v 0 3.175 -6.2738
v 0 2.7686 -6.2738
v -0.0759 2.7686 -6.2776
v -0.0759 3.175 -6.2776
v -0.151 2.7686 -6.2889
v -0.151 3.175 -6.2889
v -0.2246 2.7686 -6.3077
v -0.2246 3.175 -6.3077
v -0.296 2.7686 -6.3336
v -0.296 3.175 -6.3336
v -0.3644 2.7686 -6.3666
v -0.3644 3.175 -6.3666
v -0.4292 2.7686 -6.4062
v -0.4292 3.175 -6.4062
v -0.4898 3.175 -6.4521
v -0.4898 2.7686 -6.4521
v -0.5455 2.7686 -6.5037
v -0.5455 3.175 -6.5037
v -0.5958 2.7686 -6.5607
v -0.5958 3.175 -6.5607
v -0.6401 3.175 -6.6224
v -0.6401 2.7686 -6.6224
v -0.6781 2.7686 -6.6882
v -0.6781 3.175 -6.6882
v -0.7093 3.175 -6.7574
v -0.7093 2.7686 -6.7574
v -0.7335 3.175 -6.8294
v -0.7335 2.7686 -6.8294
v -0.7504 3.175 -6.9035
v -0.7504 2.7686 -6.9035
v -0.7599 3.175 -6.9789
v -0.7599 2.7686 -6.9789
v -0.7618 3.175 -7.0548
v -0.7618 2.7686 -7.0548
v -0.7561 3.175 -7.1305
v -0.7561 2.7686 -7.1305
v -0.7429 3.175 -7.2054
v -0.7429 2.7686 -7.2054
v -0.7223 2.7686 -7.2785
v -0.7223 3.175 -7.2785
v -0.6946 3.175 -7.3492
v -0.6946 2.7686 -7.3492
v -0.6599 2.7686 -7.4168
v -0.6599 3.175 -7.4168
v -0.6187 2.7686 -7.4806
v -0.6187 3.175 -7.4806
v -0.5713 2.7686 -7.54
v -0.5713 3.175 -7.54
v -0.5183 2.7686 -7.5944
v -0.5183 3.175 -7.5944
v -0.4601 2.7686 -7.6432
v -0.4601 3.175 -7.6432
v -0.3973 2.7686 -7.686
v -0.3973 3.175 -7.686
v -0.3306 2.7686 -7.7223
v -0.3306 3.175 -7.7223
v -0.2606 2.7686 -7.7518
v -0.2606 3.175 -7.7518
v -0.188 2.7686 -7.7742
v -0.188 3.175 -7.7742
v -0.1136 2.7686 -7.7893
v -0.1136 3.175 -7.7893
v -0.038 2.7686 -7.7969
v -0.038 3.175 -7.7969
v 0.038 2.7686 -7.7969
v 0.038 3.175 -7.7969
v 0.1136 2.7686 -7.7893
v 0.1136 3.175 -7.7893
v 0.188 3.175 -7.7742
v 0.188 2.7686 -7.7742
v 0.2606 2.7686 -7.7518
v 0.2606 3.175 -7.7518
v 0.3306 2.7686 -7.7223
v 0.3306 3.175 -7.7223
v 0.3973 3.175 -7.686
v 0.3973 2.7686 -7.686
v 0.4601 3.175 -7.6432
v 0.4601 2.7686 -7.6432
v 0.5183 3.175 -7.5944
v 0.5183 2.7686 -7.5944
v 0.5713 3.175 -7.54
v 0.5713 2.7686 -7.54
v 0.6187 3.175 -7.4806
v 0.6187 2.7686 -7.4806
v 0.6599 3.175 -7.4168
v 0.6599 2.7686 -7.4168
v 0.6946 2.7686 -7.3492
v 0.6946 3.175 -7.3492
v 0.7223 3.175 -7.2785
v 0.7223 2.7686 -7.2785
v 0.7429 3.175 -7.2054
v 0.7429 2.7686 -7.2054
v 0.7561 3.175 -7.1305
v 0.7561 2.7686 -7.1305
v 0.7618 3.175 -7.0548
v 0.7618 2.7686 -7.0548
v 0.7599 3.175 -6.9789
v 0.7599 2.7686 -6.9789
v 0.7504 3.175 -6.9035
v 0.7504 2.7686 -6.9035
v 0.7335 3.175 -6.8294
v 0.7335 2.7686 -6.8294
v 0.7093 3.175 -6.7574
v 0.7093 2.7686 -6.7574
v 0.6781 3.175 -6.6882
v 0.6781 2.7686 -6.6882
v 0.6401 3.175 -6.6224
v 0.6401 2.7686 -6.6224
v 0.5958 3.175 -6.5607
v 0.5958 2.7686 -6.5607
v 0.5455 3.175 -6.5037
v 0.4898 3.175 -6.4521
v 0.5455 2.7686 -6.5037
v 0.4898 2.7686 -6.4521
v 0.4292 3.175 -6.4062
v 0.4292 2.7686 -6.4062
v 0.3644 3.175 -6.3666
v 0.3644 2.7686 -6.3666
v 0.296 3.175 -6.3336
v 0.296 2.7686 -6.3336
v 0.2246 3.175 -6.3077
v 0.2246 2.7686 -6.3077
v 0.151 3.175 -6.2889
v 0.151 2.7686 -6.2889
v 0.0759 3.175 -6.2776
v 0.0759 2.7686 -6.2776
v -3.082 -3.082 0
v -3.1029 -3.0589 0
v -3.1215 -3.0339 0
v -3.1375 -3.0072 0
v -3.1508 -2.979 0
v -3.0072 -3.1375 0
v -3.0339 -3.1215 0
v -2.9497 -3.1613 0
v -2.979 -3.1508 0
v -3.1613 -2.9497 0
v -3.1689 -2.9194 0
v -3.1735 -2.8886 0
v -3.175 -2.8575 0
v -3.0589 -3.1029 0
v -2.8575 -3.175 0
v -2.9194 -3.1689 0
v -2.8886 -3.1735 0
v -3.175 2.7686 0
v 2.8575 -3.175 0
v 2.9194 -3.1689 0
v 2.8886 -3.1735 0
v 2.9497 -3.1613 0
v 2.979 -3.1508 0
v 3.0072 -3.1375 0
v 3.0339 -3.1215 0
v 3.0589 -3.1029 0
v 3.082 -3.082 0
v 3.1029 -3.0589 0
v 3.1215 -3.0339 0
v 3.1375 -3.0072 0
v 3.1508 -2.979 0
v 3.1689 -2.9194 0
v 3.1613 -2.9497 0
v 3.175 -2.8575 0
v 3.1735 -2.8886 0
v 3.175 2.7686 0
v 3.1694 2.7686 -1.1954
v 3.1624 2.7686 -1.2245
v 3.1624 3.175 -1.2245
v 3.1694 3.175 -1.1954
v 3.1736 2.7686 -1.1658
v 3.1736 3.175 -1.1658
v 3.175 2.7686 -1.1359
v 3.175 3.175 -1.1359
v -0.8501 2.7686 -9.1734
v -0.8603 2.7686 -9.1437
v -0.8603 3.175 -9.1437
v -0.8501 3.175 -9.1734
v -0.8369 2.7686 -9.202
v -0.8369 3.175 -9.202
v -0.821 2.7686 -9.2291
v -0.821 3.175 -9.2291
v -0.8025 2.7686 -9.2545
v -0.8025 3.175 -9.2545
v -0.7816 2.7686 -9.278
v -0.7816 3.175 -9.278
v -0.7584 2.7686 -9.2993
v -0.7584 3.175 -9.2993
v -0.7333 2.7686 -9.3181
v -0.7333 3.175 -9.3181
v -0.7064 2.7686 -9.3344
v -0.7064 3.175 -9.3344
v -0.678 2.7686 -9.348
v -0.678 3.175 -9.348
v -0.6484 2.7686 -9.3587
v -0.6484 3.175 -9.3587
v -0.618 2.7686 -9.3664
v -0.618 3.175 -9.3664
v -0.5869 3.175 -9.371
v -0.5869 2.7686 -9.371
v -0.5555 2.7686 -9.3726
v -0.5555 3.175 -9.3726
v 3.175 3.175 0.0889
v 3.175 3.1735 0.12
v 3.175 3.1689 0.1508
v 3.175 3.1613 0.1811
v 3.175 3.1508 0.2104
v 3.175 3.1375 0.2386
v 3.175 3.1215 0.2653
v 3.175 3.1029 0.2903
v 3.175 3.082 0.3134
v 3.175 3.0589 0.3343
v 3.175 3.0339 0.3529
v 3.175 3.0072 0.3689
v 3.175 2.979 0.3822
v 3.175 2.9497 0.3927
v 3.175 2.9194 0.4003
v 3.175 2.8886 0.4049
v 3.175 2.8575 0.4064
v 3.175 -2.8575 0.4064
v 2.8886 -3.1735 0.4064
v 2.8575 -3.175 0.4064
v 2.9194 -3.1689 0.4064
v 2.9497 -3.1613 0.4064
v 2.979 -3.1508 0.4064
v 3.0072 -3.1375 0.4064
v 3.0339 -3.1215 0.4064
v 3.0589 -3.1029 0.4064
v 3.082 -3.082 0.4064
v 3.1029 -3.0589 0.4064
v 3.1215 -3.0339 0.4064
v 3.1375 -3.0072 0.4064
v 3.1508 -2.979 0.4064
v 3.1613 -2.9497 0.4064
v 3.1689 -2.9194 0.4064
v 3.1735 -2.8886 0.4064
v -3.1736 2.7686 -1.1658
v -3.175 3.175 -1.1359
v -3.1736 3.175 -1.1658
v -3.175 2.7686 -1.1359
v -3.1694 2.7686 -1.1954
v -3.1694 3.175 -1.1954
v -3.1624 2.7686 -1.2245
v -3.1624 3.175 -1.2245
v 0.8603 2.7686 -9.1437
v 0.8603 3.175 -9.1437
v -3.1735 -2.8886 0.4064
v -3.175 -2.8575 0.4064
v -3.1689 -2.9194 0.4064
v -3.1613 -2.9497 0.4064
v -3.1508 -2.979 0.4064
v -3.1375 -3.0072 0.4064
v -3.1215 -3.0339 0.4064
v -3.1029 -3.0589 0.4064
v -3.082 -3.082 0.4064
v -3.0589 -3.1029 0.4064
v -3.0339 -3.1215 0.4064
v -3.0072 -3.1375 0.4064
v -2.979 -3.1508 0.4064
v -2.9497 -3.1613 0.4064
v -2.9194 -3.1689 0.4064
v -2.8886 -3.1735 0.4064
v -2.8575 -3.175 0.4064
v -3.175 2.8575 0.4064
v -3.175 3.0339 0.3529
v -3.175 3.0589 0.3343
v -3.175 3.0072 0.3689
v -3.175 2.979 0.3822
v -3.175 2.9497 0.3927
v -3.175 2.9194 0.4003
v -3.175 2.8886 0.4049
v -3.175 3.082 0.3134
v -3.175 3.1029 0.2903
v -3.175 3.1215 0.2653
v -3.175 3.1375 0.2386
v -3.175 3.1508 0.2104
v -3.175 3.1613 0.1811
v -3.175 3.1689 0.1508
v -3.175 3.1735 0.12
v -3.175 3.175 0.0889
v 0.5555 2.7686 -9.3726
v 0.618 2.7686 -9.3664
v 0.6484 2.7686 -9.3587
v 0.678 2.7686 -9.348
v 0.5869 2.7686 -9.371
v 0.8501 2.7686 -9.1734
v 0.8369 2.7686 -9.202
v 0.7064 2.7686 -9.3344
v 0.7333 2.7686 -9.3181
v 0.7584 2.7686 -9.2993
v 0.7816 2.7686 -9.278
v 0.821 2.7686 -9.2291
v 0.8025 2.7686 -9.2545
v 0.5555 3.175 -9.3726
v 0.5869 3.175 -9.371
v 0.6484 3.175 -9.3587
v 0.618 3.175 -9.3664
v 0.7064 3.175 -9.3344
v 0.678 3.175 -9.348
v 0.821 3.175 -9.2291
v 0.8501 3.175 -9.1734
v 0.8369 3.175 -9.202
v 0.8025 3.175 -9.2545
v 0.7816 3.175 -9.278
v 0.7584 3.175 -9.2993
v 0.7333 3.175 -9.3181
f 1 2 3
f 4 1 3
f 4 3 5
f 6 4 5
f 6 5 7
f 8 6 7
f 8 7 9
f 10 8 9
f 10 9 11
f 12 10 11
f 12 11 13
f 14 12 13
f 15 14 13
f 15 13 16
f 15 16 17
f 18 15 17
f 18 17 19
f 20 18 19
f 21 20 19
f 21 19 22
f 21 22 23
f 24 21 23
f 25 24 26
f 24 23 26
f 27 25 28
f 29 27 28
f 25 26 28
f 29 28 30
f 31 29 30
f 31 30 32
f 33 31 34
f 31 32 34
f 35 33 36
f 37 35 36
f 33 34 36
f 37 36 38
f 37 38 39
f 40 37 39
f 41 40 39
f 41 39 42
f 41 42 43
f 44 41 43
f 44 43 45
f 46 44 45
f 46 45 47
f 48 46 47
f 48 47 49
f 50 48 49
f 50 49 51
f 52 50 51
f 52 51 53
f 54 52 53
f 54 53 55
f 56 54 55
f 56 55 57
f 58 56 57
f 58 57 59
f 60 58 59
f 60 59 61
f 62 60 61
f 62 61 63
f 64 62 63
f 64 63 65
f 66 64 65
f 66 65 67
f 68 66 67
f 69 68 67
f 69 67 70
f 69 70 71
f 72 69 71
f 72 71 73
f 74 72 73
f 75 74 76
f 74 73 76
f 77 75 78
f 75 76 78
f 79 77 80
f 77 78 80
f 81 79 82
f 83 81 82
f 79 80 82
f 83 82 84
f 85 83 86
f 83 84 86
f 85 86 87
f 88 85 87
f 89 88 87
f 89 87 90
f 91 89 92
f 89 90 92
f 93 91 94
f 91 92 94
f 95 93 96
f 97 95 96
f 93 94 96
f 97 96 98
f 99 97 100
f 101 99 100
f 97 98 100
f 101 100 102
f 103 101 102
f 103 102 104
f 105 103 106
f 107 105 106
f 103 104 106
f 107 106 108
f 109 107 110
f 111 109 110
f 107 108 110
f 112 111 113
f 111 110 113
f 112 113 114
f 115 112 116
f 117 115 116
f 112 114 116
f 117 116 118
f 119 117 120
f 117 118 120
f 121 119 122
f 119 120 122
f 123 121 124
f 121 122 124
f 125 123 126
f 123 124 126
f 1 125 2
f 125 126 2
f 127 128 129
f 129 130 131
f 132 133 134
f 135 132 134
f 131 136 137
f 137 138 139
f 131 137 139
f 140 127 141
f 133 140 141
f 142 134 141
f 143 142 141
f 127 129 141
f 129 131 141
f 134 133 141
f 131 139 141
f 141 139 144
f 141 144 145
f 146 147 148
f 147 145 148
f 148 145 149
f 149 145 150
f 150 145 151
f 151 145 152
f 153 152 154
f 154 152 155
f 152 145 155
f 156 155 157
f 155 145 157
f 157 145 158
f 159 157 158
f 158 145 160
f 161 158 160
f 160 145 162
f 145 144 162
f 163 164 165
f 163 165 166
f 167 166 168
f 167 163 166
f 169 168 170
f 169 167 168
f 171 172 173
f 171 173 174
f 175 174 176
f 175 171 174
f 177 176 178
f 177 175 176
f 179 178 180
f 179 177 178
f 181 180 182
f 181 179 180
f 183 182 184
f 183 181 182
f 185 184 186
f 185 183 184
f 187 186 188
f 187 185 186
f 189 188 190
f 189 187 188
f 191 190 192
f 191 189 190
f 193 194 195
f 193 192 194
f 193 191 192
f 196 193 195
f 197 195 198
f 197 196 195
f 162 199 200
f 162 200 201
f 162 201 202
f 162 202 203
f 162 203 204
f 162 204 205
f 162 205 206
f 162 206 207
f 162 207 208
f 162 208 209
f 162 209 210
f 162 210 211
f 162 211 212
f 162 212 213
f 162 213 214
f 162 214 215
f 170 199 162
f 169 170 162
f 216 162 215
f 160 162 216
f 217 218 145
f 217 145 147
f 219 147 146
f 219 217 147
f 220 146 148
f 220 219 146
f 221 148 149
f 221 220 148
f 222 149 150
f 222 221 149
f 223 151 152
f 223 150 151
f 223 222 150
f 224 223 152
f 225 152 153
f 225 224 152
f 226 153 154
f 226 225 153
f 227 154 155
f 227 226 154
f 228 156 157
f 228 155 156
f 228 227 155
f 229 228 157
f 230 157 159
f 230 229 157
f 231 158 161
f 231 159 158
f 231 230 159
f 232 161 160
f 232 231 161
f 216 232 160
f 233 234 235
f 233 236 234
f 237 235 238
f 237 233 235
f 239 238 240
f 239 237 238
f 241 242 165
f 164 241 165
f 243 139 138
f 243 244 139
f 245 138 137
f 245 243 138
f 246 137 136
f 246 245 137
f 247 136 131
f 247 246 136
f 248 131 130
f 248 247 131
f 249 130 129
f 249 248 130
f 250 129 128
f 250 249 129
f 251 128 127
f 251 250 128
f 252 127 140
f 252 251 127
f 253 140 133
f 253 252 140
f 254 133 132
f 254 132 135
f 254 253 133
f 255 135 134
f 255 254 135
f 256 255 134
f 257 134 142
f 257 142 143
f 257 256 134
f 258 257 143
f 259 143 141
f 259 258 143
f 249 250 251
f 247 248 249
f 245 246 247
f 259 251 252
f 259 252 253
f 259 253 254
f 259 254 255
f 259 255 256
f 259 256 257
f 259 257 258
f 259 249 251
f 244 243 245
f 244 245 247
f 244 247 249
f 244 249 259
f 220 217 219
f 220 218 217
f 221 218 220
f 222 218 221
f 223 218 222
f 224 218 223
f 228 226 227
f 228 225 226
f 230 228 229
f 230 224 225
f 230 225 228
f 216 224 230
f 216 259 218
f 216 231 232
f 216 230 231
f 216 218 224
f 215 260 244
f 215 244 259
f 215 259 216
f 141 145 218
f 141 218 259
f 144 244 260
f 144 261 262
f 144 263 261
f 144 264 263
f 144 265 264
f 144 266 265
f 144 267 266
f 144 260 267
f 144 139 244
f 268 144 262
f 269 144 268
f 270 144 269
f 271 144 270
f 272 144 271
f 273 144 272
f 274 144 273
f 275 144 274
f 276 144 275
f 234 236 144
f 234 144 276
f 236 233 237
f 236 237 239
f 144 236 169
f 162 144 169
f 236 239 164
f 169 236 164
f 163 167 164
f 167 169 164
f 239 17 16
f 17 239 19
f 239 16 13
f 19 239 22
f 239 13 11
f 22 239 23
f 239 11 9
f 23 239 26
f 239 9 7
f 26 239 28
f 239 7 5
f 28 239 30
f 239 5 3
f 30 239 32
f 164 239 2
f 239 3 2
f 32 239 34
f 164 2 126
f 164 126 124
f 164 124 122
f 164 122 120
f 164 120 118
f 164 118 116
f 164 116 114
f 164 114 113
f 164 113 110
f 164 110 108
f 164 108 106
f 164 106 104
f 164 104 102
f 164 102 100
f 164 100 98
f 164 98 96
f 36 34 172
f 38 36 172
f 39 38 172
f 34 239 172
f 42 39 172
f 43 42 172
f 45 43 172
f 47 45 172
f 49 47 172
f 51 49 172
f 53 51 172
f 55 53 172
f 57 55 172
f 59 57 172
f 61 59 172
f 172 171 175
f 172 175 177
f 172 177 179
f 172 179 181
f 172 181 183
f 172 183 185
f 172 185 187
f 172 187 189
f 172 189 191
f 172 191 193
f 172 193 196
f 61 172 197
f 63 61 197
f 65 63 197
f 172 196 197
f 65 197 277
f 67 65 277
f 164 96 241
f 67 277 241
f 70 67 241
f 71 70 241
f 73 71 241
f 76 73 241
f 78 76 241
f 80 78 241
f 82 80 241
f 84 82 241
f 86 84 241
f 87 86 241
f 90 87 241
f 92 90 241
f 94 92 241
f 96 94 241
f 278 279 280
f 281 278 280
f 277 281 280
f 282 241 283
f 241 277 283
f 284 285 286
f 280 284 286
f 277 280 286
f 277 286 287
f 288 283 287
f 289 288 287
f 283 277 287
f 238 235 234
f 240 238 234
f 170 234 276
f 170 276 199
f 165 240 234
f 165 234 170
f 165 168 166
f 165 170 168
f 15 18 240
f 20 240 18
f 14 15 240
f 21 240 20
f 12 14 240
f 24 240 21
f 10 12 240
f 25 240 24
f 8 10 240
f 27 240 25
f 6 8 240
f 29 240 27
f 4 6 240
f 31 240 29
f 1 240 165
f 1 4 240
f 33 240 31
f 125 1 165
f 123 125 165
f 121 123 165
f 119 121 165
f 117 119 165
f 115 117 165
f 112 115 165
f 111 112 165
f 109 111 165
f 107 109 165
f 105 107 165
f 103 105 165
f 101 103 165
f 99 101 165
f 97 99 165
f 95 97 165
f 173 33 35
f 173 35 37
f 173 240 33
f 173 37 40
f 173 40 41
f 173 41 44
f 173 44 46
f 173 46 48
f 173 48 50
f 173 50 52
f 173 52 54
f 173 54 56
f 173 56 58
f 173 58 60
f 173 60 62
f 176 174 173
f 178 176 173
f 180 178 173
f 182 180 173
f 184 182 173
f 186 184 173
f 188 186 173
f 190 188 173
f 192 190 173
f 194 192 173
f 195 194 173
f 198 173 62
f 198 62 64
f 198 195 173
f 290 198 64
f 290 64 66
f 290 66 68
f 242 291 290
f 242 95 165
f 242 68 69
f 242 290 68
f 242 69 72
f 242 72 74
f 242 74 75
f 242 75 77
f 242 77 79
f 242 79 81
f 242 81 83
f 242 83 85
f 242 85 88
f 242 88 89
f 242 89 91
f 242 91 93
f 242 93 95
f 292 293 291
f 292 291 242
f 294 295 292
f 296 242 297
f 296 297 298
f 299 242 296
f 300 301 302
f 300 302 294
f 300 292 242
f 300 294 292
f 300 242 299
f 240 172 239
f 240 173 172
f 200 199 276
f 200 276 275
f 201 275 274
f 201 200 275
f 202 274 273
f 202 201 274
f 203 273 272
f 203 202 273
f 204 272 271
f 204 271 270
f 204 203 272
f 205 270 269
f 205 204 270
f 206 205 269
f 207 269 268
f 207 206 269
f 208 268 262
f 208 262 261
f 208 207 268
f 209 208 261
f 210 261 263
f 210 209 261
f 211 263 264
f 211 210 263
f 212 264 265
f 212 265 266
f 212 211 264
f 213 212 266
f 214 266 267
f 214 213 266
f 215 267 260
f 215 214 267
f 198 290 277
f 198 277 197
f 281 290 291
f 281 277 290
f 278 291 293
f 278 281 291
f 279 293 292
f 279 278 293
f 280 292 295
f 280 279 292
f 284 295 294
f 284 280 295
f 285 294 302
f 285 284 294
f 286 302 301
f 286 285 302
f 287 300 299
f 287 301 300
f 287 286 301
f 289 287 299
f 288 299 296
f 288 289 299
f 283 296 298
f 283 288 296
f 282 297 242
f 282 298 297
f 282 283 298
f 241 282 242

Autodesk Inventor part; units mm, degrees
ref_plane "YZ Plane" through (0, 0, 0) normal (1, 0, 0) x (0, 1, 0)
ref_plane "XZ Plane" through (0, 0, 0) normal (0, 1, 0) x (-1, 0, 0)
ref_plane "XY Plane" through (0, 0, 0) normal (0, 0, 1) x (1, 0, 0)
sketch "Sketch1" plane through (0, 0, 0) normal (0, 0, 1) x (1, 0, 0)
  line L0 (-3.175, 3.175) -> (3.175, 3.175)
  line L1 (3.175, 3.175) -> (3.175, -3.175)
  line L2 (3.175, -3.175) -> (-3.175, -3.175)
  line L3 (-3.175, -3.175) -> (-3.175, 3.175)
  point P0 (0, 0)
  dimension "d0" = 6.35
  dimension "d1" = 3.175
  dimension "d2" = 3.175
extrude "Extrusion1" add sketch "Sketch1" along normal blind 0.4064
sketch "Sketch2" plane through (-3.175, 3.175, 0) normal (0, 1, 0) x (1, 0, 0)
  line L0 (0, -0.4064) -> (6.35, -0.4064) projected
  line L1 (6.35, 0) -> (6.35, -0.4064) projected
  line L2 (0, 0) -> (6.35, 0) projected
  line L3 (0, 0) -> (0, -0.4064) projected
  line L4 (0, -0.4064) -> (6.35, -0.4064)
  line L5 (6.35, -0.4064) -> (6.35, 1.1811)
  line L6 (3.9688, 9.3726) -> (2.3812, 9.3726)
  line L7 (0, 1.1811) -> (0, -0.4064)
  line L8 (2.3812, 9.3726) -> (0, 1.1811)
  line L9 (3.9688, 9.3726) -> (6.35, 1.1811)
  point P0 (3.175, 0)
  dimension "d7" = 9.779
  dimension "d8" = 1.5875
  dimension "d9" = 1.5875
extrude "Extrusion2" add sketch "Sketch2" against normal blind 0.4064 contours L7 L8 L6 L9 L5 L2
fillet "Fillet1" radius 0.3175 1 edges at (0, 3.175, 0.4064)
fillet "Fillet2" radius 0.3175 2 edges at (-0.7938, 2.9718, -9.3726) (0.7938, 2.9718, -9.3726)
fillet "Fillet3" radius 0.3175 4 edges at (3.175, -3.175, 0.2032) (-3.175, -3.175, 0.2032) (3.175, 2.9718, -1.1811) (-3.175, 2.9718, -1.1811)
hole "Hole1" at (0, 3.175, -7.0358) direction (0, -1, 0) diameter 1.524 depth 25.4 tip angle 118
equation "\"d1\" = 0.5 * d0"
equation "\"d2\" = d1"
properties part number "Control_Horn"
